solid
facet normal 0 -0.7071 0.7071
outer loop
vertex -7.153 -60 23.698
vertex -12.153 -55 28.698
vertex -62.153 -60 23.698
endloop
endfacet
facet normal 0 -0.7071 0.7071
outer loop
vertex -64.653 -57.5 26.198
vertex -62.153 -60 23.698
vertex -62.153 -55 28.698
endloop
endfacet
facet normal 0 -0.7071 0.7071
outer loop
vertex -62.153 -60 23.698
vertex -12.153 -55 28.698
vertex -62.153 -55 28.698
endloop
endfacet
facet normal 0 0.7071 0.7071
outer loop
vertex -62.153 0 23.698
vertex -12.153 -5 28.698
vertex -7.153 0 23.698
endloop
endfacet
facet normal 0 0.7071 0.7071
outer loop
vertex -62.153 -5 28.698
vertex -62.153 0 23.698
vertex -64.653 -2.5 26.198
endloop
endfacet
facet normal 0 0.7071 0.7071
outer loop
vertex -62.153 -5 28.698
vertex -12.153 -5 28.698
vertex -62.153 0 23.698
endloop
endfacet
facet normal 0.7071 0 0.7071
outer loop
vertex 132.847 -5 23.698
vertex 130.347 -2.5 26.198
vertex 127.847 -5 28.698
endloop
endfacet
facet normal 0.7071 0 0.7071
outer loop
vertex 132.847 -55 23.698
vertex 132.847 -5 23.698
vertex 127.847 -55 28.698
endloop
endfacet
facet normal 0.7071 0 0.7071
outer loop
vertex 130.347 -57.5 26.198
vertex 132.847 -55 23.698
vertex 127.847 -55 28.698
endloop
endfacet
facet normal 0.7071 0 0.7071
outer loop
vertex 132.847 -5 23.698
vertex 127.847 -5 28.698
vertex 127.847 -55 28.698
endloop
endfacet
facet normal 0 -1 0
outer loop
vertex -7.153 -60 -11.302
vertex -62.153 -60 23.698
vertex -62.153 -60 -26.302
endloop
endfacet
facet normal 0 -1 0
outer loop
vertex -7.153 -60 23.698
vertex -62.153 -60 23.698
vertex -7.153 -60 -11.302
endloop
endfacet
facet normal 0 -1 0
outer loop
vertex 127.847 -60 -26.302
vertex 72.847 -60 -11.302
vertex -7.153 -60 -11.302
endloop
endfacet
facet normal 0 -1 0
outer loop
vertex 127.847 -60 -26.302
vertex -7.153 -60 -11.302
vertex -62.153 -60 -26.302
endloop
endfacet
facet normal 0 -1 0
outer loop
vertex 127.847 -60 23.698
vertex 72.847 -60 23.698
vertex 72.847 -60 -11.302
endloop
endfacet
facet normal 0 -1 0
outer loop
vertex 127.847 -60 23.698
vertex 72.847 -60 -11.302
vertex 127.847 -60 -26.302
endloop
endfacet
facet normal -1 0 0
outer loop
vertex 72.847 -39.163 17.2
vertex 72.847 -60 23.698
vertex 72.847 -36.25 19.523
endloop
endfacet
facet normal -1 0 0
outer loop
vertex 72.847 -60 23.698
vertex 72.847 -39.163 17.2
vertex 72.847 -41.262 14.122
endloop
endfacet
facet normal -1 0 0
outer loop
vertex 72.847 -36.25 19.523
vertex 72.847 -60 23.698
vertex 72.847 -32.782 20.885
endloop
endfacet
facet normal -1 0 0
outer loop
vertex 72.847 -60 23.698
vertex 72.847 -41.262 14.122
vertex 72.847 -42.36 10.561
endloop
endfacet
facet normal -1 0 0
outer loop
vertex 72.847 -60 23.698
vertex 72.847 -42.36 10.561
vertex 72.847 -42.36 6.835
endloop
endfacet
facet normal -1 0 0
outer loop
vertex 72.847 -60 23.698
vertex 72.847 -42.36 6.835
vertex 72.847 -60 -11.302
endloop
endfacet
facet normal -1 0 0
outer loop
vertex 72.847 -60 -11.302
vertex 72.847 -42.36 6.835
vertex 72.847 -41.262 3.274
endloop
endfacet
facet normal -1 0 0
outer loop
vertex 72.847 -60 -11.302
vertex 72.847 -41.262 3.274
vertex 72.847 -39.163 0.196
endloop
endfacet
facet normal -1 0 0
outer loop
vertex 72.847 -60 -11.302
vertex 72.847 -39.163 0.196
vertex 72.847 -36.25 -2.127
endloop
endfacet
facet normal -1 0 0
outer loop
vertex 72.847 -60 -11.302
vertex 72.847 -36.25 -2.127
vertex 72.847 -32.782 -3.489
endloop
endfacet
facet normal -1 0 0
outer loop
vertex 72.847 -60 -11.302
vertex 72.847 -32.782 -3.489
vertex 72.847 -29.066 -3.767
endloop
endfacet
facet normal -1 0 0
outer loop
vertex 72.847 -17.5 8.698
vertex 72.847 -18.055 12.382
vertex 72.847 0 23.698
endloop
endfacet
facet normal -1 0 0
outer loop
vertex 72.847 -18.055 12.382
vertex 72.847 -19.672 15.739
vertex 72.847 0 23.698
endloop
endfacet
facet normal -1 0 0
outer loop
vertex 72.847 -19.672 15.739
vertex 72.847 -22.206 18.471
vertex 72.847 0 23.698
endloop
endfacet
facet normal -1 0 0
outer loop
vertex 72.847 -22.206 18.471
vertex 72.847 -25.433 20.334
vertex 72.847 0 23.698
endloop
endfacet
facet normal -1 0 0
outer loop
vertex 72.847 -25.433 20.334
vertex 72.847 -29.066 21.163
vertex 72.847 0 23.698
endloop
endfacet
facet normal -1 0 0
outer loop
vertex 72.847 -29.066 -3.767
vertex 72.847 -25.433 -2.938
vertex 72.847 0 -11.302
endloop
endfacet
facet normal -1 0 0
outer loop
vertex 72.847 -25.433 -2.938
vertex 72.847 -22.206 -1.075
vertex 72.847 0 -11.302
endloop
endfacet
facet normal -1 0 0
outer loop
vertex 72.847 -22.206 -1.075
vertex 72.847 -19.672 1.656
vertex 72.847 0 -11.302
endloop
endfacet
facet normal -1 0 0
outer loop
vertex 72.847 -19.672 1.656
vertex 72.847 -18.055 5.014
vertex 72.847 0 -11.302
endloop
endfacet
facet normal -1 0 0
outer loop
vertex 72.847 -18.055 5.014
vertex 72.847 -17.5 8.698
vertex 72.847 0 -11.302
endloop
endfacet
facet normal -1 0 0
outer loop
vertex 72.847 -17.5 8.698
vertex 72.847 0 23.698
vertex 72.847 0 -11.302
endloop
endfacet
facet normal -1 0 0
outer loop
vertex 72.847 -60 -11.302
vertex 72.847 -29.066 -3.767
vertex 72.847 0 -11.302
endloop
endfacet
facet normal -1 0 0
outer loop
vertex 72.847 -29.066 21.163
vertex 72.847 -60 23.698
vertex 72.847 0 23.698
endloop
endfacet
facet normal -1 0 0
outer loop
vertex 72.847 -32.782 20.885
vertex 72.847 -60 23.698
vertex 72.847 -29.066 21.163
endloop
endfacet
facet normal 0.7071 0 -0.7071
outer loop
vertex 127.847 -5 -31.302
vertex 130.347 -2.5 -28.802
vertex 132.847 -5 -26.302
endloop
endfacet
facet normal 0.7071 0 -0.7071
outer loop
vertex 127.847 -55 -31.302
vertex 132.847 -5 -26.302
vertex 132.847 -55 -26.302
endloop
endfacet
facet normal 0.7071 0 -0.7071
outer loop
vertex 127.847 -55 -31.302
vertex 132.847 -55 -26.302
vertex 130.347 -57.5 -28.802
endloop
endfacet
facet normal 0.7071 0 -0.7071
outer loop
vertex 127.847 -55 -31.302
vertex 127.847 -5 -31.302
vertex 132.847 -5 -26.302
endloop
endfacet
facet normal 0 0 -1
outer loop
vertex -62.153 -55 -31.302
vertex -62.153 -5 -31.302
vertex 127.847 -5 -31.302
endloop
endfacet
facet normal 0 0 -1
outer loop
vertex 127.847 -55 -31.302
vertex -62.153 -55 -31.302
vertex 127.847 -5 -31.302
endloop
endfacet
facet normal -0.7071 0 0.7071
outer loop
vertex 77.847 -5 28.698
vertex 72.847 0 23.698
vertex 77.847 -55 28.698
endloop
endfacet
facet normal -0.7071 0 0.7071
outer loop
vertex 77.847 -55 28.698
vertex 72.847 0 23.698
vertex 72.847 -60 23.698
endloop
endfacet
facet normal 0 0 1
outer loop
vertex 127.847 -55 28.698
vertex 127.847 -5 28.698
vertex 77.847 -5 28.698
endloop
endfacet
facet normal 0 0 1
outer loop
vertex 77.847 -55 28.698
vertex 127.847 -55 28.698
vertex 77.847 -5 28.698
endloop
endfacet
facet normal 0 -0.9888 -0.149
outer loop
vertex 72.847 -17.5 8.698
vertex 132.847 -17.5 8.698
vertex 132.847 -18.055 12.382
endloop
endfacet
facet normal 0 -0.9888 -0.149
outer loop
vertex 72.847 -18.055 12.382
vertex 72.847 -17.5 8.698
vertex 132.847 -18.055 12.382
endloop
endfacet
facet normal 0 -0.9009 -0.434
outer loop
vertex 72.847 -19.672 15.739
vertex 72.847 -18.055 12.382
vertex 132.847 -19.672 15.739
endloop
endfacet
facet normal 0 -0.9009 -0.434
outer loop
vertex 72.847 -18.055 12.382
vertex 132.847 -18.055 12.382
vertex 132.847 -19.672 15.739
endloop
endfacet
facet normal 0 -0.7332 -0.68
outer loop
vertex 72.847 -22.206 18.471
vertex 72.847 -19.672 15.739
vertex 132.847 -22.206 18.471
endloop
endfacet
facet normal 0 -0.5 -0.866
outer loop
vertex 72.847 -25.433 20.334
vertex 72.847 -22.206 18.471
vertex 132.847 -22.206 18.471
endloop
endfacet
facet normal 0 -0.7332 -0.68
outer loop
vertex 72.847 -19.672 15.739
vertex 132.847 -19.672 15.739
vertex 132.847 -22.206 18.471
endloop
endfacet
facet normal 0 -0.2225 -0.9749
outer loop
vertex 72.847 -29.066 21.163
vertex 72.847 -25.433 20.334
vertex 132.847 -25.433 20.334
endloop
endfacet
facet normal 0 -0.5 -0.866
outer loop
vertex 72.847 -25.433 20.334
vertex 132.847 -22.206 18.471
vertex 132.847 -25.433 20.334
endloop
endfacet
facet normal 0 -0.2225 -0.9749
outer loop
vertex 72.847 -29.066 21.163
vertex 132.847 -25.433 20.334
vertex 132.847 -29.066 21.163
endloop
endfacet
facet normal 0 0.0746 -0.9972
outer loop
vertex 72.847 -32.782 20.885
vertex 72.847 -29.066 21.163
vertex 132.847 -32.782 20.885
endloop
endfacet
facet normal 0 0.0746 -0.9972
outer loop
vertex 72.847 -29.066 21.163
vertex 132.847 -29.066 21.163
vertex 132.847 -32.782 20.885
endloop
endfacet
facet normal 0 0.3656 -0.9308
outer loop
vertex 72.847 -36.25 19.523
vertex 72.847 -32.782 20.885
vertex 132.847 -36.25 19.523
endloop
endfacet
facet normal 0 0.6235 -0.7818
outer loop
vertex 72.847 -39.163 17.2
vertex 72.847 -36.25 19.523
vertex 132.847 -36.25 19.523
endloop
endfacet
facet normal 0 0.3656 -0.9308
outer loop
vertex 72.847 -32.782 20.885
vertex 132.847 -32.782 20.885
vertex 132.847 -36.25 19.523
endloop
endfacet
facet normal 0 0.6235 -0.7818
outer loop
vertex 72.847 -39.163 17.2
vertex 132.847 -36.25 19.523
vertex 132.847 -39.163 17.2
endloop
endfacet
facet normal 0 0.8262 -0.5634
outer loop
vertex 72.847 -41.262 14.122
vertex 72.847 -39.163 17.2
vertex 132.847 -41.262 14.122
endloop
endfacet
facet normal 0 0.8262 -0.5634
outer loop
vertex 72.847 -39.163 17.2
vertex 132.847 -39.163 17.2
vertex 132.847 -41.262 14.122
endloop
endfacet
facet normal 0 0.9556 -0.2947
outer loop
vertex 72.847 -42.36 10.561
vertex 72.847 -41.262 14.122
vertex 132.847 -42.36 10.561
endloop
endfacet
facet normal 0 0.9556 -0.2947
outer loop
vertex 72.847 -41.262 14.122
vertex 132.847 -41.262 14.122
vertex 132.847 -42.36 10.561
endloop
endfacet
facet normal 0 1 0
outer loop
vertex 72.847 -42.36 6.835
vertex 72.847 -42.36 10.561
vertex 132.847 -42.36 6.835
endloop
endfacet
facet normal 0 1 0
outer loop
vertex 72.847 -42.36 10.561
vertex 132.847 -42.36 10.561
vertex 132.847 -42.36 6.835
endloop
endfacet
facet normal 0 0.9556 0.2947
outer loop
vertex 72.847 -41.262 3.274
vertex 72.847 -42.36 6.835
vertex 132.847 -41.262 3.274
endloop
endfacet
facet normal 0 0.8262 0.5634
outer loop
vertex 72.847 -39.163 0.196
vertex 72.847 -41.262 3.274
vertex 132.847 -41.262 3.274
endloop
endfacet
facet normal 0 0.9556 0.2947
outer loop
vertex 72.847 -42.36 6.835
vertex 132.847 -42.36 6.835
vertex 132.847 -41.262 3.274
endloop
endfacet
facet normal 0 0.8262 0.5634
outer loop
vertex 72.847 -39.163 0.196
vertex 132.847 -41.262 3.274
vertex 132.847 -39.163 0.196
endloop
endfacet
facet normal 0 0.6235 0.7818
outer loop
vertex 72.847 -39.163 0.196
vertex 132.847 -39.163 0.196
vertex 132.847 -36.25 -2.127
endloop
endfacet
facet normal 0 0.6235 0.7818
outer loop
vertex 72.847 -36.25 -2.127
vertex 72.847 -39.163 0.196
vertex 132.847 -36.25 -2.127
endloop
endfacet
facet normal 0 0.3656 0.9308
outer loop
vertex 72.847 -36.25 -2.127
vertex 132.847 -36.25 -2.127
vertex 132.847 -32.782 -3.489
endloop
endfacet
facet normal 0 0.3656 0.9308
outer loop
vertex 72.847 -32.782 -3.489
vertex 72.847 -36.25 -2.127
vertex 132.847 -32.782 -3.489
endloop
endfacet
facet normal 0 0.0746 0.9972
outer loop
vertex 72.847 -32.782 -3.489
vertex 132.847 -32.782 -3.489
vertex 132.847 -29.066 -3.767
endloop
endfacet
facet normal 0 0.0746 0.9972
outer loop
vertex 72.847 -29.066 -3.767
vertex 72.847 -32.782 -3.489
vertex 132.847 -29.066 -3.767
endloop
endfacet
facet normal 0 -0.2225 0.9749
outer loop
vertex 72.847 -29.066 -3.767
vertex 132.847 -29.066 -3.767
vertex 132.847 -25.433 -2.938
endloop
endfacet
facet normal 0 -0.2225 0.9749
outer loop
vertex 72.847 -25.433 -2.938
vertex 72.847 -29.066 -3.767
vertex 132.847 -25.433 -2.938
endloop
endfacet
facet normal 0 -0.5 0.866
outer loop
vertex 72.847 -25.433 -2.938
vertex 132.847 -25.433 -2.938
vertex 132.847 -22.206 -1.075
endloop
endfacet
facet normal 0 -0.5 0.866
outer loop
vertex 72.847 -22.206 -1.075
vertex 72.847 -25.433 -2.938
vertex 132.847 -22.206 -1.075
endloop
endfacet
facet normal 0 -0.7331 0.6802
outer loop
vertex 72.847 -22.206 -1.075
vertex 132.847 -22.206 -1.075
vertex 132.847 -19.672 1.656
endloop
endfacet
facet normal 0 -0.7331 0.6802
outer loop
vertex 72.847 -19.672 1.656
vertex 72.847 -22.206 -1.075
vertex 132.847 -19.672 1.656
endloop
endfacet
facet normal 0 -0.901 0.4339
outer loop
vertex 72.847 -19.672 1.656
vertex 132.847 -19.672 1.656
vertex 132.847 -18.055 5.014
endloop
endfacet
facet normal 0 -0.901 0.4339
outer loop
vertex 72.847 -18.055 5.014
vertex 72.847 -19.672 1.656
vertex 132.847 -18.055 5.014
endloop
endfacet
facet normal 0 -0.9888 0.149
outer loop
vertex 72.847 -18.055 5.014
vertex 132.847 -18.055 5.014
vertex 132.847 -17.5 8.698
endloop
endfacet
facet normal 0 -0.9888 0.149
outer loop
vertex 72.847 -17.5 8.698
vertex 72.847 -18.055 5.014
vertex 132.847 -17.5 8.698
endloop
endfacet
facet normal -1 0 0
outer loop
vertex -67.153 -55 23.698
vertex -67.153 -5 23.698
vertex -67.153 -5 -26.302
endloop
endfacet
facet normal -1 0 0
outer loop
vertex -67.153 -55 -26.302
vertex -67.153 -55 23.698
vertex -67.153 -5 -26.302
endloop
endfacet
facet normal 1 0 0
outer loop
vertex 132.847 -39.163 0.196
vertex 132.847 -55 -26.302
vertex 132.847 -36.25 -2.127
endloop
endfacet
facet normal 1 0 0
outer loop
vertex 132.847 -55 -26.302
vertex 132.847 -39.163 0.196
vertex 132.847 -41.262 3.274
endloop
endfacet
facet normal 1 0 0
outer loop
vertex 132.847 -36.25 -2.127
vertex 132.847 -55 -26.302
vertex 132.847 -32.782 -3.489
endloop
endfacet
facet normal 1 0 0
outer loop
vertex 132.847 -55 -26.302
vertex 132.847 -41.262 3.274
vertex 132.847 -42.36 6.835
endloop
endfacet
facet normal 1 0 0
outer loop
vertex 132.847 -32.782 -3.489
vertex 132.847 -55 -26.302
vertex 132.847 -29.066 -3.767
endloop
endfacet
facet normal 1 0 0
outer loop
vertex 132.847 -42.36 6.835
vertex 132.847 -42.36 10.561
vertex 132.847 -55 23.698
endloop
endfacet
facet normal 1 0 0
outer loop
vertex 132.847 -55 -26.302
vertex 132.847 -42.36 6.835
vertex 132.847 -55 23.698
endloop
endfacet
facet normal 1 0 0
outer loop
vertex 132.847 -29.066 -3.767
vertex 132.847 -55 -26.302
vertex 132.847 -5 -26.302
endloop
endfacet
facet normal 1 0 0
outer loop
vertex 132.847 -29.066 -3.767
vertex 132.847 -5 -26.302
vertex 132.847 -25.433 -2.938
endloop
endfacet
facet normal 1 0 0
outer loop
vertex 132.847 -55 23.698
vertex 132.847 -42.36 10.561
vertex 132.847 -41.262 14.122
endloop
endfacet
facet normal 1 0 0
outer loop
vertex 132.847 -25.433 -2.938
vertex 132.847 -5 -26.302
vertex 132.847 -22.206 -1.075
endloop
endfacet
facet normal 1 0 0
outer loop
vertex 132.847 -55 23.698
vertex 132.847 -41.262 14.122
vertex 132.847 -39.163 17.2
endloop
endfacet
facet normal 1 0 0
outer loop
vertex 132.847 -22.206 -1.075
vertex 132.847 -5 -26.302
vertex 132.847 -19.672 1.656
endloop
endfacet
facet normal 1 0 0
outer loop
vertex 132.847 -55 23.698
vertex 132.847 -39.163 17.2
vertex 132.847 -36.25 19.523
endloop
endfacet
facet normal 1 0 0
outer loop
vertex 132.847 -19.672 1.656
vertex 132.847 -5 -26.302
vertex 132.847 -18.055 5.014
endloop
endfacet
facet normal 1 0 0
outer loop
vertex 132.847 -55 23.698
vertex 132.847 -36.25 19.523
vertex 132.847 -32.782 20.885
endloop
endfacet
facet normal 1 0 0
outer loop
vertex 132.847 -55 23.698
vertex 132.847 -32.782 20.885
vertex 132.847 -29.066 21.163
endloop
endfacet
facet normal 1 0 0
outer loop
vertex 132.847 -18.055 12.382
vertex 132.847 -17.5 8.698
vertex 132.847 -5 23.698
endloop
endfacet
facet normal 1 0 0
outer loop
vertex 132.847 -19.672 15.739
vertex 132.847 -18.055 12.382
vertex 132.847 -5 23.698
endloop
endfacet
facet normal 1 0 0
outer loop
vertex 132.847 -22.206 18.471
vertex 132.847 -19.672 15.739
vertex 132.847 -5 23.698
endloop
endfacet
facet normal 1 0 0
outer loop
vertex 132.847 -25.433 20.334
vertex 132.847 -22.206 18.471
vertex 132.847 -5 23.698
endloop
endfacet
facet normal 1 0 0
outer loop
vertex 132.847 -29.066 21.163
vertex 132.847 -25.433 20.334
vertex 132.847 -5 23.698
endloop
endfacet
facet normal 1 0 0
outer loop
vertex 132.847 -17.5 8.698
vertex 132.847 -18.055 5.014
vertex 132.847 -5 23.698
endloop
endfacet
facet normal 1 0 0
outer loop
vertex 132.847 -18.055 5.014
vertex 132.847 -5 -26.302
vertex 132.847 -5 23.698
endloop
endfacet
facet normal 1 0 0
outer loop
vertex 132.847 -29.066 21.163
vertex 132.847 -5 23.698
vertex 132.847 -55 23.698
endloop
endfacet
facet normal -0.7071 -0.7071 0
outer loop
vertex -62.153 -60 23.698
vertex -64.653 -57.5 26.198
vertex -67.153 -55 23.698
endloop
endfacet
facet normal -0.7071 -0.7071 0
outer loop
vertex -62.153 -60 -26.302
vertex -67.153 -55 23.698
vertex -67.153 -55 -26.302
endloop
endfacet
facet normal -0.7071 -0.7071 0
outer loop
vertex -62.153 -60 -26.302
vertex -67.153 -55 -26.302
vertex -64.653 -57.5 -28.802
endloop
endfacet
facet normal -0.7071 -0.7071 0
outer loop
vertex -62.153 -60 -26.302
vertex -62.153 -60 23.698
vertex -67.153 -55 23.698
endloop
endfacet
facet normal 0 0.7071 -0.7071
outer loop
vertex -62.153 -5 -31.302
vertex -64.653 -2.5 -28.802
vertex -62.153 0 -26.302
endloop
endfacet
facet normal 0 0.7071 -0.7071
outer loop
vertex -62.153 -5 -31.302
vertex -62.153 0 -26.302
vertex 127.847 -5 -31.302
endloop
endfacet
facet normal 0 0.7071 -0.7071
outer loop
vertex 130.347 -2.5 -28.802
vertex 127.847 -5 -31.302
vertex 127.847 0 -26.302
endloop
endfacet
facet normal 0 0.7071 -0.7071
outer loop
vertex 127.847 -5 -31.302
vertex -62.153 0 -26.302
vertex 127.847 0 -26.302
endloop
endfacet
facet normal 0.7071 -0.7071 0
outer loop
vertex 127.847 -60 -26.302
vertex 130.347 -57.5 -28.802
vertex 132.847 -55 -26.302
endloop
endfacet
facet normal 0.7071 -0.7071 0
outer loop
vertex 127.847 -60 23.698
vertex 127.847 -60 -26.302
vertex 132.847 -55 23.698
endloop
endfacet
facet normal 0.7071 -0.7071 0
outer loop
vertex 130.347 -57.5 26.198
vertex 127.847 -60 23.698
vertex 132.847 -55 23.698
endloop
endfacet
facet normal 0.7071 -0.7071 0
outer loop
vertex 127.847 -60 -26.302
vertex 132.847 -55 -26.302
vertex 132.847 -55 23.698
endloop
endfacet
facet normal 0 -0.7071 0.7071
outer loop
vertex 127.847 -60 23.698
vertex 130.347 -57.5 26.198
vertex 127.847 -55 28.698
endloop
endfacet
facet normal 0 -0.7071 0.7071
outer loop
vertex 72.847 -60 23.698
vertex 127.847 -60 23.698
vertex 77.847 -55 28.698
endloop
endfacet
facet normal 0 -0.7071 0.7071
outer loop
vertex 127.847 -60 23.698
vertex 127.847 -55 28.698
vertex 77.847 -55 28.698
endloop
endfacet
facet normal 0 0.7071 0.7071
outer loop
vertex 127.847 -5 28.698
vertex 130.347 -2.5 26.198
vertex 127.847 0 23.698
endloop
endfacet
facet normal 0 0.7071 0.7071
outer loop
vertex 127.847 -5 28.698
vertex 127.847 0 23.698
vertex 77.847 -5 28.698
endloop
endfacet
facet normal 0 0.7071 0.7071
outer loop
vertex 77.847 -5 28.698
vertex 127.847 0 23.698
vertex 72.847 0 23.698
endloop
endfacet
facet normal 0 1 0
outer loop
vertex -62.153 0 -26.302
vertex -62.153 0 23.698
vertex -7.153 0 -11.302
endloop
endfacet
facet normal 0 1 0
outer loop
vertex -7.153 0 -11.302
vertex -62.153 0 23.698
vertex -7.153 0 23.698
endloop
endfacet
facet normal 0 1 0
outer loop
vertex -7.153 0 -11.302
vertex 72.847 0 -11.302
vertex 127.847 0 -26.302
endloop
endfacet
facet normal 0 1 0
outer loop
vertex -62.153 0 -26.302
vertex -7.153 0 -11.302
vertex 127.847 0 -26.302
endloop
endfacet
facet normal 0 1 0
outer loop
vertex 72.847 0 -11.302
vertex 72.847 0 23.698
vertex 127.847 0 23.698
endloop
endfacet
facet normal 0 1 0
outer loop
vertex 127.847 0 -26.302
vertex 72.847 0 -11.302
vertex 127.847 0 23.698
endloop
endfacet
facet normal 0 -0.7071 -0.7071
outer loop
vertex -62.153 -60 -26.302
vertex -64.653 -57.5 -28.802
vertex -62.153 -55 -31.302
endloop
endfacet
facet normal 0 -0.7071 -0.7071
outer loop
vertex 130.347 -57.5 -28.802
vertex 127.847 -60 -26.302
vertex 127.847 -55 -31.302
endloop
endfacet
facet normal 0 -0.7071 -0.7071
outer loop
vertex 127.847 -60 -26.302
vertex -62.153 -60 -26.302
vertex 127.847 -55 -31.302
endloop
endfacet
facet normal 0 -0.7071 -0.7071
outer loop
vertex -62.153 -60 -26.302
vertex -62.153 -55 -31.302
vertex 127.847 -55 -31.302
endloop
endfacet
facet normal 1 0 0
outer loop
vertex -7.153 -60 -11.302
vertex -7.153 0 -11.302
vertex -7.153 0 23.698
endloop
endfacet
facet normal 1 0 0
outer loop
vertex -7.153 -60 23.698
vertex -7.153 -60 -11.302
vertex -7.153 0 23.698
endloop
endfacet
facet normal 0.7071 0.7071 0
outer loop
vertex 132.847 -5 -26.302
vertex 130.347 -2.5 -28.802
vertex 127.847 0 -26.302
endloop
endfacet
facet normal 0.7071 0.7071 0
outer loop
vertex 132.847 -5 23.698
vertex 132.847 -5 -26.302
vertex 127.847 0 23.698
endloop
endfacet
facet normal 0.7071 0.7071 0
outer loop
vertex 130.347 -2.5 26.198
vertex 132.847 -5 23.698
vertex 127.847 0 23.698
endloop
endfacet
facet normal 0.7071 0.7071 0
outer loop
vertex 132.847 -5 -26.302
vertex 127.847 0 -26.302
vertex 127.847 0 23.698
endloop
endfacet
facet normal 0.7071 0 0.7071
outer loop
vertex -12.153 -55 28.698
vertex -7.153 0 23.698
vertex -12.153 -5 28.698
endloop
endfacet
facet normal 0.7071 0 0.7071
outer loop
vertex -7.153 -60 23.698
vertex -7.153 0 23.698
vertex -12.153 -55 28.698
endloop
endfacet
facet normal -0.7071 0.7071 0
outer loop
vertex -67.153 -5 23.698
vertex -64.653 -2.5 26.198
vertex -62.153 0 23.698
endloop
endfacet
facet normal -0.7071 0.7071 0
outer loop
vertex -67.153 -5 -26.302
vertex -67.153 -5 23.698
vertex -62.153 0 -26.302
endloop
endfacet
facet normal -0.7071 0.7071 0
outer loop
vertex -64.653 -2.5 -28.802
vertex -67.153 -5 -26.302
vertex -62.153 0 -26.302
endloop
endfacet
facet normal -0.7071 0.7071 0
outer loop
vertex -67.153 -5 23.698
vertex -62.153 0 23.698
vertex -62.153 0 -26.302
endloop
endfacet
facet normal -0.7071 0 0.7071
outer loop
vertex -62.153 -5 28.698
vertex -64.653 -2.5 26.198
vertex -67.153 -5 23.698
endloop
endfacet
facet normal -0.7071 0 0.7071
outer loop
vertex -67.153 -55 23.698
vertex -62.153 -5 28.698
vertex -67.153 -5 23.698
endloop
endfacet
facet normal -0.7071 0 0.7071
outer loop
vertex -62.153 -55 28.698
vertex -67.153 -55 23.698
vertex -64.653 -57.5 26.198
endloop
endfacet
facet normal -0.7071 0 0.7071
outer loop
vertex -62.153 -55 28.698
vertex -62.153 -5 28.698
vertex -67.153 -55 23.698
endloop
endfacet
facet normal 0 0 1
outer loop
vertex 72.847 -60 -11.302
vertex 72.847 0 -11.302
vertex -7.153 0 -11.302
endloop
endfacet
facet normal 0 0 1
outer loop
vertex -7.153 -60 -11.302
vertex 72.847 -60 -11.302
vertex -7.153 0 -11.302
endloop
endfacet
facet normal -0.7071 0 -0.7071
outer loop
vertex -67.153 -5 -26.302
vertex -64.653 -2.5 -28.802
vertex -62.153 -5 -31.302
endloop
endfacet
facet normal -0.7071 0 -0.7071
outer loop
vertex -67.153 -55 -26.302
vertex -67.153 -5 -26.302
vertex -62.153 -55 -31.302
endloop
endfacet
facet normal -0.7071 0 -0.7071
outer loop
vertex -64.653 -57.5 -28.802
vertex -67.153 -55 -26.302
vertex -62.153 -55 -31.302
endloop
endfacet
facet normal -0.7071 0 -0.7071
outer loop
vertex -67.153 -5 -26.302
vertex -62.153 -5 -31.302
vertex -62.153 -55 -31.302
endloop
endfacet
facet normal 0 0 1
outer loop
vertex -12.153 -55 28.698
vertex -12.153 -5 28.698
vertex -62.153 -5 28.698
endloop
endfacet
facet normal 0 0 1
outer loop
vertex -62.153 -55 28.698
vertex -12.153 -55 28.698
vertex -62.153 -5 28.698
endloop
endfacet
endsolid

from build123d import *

# Parameters (mm, degrees)
F1_DEPTH = 60
F2_R     = 12.5
F3_DEPTH = 99
F4_SIZE  = 5
F5_SIZE  = 5
F6_SIZE  = 5
F7_SIZE  = 5


with BuildPart() as f1:
    # F0 (on Front) → F1 (new body)
    with BuildSketch(Plane.XZ):
        Polygon((-7.1532973647, 28.6979936063), (-67.1532973647, 28.6979936063), (-67.1532973647, -31.3020063937), (132.8467026353, -31.3020063937), (132.8467026353, 28.6979936063), (72.8467026353, 28.6979936063), (72.8467026353, -11.3020063937), (-7.1532973647, -11.3020063937), align=None)
    extrude(amount=F1_DEPTH)

    # F2 (on face) → F3 (cut)
    with BuildSketch(Plane.YZ.offset(132.8467026353)):
        with Locations((-30, 8.6979936063)):
            Circle(F2_R)
    extrude(amount=-F3_DEPTH, mode=Mode.SUBTRACT)

    # F4
    f4_edges = [f1.edges().sort_by_distance(p)[0] for p in [
        (-67.153297, -60, -1.302006),
        (-67.153297, 0, -1.302006),
    ]]
    chamfer(f4_edges, length=F4_SIZE)

    # F5 (call 1 of 2: OpenCascade refuses the feature's edges together)
    f5_edges = [f1.edges().sort_by_distance(p)[0] for p in [
        (35.346703, -60, -31.302006),
    ]]
    chamfer(f5_edges, length=F5_SIZE)

    # F5#2 (call 2 of 2)
    f5_2_edges = [f1.edges().sort_by_distance(p)[0] for p in [
        (-67.153297, -30, -31.302006),
    ]]
    chamfer(f5_2_edges, length=F5_SIZE)

    # F6
    f6_edges = [f1.edges().sort_by_distance(p)[0] for p in [
        (-67.153297, -30, 28.697994),
        (132.846703, -30, 28.697994),
        (102.846703, 0, 28.697994),
        (102.846703, -60, 28.697994),
        (72.846703, -30, 28.697994),
        (35.346703, 0, -31.302006),
    ]]
    chamfer(f6_edges, length=F6_SIZE)

    # F7 (call 1 of 4: OpenCascade refuses the feature's edges together)
    f7_edges = [f1.edges().sort_by_distance(p)[0] for p in [
        (132.846703, -60, -1.302006),
    ]]
    chamfer(f7_edges, length=F7_SIZE)

    # F7#2 (call 2 of 4)
    f7_2_edges = [f1.edges().sort_by_distance(p)[0] for p in [
        (132.846703, 0, -1.302006),
    ]]
    chamfer(f7_2_edges, length=F7_SIZE)

    # F7#3 (call 3 of 4)
    f7_3_edges = [f1.edges().sort_by_distance(p)[0] for p in [
        (132.846703, -30, -31.302006),
    ]]
    chamfer(f7_3_edges, length=F7_SIZE)

    # F7#4 (call 4 of 4)
    f7_4_edges = [f1.edges().sort_by_distance(p)[0] for p in [
        (-7.153297, -30, 28.697994),
        (-34.653297, -60, 28.697994),
        (-34.653297, 0, 28.697994),
    ]]
    chamfer(f7_4_edges, length=F7_SIZE)


solid = f1.part
